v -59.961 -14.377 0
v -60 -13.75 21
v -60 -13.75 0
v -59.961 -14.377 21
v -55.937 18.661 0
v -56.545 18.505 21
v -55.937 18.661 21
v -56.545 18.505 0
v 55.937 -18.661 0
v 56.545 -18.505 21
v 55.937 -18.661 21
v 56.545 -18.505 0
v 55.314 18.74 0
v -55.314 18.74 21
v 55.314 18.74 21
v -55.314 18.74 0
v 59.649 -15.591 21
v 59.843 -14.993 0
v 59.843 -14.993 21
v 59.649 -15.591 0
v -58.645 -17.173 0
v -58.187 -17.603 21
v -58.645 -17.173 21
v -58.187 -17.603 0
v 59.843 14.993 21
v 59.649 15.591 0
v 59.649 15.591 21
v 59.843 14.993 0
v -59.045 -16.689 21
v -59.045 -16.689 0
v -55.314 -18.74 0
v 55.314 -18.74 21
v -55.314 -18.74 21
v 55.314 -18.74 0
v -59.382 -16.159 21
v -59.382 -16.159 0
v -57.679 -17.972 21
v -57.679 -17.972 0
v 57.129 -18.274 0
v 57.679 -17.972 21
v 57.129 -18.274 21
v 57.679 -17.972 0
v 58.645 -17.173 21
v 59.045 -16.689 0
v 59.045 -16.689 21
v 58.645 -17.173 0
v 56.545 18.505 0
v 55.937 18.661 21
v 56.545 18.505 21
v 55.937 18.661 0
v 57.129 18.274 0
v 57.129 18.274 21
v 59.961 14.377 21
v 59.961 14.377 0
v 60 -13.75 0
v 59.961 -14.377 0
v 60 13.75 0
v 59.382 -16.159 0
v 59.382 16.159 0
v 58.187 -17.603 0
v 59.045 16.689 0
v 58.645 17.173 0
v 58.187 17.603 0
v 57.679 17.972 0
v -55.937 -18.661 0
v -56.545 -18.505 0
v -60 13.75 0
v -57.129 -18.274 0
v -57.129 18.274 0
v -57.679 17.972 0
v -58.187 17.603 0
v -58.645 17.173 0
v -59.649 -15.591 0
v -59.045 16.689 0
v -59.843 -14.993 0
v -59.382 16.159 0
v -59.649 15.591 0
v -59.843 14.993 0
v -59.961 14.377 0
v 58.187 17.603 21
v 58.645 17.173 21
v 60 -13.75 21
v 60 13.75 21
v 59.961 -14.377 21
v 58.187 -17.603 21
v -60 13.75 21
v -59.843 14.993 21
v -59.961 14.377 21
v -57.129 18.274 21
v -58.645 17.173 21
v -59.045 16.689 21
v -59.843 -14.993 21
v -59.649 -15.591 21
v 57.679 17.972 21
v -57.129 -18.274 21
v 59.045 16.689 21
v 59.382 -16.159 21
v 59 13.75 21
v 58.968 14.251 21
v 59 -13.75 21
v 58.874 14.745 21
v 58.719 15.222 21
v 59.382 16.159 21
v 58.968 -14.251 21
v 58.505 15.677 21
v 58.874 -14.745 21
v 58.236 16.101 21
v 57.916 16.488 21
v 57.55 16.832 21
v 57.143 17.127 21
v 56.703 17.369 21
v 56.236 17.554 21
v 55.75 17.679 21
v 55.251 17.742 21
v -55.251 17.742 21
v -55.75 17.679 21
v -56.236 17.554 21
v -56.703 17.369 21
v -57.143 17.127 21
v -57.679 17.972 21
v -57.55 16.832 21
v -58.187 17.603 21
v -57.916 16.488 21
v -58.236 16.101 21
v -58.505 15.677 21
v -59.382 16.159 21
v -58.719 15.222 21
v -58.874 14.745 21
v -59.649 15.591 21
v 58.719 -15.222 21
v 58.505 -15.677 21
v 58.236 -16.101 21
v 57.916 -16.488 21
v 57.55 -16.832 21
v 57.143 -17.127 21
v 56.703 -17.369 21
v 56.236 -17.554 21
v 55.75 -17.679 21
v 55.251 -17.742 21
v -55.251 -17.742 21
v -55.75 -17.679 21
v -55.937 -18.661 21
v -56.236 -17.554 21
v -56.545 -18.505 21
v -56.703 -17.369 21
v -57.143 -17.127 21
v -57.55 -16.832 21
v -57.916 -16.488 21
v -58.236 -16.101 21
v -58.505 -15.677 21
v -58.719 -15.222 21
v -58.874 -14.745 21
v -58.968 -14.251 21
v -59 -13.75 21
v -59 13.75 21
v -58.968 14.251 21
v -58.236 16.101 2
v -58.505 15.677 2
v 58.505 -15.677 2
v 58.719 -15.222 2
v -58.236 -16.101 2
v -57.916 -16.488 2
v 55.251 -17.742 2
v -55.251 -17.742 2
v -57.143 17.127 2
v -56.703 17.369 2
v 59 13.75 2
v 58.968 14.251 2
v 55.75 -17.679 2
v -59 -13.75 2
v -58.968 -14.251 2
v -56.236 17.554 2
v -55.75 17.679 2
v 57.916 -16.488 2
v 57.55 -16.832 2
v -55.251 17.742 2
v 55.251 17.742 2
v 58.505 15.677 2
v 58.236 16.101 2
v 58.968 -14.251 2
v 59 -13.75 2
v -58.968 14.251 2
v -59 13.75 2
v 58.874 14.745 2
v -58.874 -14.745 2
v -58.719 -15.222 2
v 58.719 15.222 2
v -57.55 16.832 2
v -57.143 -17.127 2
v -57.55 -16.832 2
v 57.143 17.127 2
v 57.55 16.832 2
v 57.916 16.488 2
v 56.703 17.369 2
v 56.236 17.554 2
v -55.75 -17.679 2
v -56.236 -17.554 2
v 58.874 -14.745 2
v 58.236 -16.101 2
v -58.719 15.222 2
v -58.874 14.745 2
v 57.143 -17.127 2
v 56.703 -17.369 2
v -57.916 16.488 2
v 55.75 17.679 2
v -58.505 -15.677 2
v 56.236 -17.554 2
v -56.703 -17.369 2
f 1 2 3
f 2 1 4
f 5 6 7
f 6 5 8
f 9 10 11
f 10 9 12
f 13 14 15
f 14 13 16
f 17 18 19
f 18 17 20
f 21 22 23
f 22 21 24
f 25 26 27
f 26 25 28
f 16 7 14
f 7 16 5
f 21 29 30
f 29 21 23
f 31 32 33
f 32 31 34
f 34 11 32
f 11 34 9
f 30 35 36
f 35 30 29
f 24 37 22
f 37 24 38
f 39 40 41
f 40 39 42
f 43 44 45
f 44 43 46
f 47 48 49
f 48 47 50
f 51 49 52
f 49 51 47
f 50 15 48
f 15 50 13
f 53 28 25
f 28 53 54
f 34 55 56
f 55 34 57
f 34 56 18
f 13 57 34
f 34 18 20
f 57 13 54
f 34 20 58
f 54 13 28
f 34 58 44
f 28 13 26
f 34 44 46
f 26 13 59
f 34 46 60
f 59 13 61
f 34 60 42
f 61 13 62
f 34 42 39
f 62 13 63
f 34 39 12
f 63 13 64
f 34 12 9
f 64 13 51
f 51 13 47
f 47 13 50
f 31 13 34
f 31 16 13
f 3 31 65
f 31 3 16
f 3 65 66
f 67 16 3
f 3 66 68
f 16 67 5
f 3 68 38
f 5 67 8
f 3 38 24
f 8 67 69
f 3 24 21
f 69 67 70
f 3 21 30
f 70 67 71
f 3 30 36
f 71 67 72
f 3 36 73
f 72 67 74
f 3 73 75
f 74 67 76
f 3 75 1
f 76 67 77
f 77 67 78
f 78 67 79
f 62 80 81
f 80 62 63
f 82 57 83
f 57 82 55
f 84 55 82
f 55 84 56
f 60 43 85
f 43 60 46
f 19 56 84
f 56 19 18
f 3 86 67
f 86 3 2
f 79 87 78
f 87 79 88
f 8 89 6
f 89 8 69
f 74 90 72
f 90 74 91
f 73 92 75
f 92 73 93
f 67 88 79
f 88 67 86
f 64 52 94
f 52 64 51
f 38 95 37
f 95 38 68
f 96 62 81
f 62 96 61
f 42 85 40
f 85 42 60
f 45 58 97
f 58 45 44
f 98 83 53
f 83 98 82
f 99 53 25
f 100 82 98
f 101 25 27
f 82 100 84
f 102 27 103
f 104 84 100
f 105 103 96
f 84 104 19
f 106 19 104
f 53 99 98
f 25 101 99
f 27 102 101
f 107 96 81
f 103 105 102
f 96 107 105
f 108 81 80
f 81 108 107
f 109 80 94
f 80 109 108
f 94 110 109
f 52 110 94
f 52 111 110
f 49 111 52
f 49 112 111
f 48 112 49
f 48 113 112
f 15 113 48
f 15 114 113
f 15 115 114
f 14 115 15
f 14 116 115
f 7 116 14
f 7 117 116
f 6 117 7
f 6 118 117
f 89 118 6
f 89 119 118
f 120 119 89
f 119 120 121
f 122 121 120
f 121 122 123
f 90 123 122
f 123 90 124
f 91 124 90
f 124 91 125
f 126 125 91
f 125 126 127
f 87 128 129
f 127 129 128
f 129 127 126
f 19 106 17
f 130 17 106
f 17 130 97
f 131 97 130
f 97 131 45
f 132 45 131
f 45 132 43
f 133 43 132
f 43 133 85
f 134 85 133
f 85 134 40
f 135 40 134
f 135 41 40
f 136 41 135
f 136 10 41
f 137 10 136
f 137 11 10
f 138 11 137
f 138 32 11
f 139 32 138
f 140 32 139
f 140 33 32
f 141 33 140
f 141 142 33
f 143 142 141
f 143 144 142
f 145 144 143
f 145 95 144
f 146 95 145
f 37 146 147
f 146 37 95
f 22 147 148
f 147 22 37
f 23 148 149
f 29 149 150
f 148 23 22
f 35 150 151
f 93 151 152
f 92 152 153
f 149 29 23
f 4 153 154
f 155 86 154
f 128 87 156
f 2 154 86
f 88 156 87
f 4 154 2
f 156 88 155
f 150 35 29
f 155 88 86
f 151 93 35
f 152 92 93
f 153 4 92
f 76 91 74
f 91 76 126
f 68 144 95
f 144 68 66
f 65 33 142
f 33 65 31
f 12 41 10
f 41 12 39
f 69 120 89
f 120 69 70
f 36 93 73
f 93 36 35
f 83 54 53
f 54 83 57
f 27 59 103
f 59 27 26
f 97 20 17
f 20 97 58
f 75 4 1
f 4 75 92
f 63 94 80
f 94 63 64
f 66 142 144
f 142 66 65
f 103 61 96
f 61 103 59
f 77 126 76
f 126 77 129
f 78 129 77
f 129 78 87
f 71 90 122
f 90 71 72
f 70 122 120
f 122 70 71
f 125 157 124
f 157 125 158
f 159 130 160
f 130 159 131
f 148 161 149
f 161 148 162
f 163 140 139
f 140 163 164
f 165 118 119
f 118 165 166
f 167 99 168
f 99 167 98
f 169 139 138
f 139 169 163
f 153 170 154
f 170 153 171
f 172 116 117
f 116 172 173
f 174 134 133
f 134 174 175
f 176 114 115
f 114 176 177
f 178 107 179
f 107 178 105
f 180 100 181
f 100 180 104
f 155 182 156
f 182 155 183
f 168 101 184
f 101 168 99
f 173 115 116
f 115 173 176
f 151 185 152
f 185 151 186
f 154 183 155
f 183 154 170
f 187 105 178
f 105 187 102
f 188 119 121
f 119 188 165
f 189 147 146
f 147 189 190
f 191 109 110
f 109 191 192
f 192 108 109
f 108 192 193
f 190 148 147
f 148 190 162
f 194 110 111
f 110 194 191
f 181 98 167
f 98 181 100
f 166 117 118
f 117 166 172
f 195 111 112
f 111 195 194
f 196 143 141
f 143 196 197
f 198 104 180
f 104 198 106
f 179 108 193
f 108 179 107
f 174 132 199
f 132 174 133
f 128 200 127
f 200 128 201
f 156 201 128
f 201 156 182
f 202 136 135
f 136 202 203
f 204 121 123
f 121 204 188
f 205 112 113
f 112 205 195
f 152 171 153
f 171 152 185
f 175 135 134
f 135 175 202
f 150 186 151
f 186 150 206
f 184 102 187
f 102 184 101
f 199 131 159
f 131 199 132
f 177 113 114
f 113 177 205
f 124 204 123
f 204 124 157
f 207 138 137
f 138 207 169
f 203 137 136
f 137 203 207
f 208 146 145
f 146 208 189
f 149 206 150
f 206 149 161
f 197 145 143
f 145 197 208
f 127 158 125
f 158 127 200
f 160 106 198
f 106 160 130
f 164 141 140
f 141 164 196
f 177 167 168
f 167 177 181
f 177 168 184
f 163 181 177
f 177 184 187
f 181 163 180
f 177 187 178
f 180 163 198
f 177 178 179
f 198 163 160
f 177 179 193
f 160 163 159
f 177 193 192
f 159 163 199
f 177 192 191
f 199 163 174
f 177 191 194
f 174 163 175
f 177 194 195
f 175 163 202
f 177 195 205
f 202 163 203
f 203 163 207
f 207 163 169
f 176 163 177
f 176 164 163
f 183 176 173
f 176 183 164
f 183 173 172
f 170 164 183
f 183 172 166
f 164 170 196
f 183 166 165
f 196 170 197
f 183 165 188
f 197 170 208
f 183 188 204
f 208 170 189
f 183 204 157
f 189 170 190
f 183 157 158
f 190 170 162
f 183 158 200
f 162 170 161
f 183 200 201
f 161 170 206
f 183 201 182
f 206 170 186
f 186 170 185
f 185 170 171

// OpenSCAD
$fn = 50;


difference() {
	union() {
		hull() {
			translate(v = [-55.0000000000, 13.7500000000, 0]) {
				cylinder(h = 21, r = 5);
			}
			translate(v = [55.0000000000, 13.7500000000, 0]) {
				cylinder(h = 21, r = 5);
			}
			translate(v = [-55.0000000000, -13.7500000000, 0]) {
				cylinder(h = 21, r = 5);
			}
			translate(v = [55.0000000000, -13.7500000000, 0]) {
				cylinder(h = 21, r = 5);
			}
		}
	}
	union() {
		translate(v = [0, 0, 2]) {
			hull() {
				translate(v = [-55.0000000000, 13.7500000000, 0]) {
					cylinder(h = 19, r = 4);
				}
				translate(v = [55.0000000000, 13.7500000000, 0]) {
					cylinder(h = 19, r = 4);
				}
				translate(v = [-55.0000000000, -13.7500000000, 0]) {
					cylinder(h = 19, r = 4);
				}
				translate(v = [55.0000000000, -13.7500000000, 0]) {
					cylinder(h = 19, r = 4);
				}
			}
		}
	}
}
